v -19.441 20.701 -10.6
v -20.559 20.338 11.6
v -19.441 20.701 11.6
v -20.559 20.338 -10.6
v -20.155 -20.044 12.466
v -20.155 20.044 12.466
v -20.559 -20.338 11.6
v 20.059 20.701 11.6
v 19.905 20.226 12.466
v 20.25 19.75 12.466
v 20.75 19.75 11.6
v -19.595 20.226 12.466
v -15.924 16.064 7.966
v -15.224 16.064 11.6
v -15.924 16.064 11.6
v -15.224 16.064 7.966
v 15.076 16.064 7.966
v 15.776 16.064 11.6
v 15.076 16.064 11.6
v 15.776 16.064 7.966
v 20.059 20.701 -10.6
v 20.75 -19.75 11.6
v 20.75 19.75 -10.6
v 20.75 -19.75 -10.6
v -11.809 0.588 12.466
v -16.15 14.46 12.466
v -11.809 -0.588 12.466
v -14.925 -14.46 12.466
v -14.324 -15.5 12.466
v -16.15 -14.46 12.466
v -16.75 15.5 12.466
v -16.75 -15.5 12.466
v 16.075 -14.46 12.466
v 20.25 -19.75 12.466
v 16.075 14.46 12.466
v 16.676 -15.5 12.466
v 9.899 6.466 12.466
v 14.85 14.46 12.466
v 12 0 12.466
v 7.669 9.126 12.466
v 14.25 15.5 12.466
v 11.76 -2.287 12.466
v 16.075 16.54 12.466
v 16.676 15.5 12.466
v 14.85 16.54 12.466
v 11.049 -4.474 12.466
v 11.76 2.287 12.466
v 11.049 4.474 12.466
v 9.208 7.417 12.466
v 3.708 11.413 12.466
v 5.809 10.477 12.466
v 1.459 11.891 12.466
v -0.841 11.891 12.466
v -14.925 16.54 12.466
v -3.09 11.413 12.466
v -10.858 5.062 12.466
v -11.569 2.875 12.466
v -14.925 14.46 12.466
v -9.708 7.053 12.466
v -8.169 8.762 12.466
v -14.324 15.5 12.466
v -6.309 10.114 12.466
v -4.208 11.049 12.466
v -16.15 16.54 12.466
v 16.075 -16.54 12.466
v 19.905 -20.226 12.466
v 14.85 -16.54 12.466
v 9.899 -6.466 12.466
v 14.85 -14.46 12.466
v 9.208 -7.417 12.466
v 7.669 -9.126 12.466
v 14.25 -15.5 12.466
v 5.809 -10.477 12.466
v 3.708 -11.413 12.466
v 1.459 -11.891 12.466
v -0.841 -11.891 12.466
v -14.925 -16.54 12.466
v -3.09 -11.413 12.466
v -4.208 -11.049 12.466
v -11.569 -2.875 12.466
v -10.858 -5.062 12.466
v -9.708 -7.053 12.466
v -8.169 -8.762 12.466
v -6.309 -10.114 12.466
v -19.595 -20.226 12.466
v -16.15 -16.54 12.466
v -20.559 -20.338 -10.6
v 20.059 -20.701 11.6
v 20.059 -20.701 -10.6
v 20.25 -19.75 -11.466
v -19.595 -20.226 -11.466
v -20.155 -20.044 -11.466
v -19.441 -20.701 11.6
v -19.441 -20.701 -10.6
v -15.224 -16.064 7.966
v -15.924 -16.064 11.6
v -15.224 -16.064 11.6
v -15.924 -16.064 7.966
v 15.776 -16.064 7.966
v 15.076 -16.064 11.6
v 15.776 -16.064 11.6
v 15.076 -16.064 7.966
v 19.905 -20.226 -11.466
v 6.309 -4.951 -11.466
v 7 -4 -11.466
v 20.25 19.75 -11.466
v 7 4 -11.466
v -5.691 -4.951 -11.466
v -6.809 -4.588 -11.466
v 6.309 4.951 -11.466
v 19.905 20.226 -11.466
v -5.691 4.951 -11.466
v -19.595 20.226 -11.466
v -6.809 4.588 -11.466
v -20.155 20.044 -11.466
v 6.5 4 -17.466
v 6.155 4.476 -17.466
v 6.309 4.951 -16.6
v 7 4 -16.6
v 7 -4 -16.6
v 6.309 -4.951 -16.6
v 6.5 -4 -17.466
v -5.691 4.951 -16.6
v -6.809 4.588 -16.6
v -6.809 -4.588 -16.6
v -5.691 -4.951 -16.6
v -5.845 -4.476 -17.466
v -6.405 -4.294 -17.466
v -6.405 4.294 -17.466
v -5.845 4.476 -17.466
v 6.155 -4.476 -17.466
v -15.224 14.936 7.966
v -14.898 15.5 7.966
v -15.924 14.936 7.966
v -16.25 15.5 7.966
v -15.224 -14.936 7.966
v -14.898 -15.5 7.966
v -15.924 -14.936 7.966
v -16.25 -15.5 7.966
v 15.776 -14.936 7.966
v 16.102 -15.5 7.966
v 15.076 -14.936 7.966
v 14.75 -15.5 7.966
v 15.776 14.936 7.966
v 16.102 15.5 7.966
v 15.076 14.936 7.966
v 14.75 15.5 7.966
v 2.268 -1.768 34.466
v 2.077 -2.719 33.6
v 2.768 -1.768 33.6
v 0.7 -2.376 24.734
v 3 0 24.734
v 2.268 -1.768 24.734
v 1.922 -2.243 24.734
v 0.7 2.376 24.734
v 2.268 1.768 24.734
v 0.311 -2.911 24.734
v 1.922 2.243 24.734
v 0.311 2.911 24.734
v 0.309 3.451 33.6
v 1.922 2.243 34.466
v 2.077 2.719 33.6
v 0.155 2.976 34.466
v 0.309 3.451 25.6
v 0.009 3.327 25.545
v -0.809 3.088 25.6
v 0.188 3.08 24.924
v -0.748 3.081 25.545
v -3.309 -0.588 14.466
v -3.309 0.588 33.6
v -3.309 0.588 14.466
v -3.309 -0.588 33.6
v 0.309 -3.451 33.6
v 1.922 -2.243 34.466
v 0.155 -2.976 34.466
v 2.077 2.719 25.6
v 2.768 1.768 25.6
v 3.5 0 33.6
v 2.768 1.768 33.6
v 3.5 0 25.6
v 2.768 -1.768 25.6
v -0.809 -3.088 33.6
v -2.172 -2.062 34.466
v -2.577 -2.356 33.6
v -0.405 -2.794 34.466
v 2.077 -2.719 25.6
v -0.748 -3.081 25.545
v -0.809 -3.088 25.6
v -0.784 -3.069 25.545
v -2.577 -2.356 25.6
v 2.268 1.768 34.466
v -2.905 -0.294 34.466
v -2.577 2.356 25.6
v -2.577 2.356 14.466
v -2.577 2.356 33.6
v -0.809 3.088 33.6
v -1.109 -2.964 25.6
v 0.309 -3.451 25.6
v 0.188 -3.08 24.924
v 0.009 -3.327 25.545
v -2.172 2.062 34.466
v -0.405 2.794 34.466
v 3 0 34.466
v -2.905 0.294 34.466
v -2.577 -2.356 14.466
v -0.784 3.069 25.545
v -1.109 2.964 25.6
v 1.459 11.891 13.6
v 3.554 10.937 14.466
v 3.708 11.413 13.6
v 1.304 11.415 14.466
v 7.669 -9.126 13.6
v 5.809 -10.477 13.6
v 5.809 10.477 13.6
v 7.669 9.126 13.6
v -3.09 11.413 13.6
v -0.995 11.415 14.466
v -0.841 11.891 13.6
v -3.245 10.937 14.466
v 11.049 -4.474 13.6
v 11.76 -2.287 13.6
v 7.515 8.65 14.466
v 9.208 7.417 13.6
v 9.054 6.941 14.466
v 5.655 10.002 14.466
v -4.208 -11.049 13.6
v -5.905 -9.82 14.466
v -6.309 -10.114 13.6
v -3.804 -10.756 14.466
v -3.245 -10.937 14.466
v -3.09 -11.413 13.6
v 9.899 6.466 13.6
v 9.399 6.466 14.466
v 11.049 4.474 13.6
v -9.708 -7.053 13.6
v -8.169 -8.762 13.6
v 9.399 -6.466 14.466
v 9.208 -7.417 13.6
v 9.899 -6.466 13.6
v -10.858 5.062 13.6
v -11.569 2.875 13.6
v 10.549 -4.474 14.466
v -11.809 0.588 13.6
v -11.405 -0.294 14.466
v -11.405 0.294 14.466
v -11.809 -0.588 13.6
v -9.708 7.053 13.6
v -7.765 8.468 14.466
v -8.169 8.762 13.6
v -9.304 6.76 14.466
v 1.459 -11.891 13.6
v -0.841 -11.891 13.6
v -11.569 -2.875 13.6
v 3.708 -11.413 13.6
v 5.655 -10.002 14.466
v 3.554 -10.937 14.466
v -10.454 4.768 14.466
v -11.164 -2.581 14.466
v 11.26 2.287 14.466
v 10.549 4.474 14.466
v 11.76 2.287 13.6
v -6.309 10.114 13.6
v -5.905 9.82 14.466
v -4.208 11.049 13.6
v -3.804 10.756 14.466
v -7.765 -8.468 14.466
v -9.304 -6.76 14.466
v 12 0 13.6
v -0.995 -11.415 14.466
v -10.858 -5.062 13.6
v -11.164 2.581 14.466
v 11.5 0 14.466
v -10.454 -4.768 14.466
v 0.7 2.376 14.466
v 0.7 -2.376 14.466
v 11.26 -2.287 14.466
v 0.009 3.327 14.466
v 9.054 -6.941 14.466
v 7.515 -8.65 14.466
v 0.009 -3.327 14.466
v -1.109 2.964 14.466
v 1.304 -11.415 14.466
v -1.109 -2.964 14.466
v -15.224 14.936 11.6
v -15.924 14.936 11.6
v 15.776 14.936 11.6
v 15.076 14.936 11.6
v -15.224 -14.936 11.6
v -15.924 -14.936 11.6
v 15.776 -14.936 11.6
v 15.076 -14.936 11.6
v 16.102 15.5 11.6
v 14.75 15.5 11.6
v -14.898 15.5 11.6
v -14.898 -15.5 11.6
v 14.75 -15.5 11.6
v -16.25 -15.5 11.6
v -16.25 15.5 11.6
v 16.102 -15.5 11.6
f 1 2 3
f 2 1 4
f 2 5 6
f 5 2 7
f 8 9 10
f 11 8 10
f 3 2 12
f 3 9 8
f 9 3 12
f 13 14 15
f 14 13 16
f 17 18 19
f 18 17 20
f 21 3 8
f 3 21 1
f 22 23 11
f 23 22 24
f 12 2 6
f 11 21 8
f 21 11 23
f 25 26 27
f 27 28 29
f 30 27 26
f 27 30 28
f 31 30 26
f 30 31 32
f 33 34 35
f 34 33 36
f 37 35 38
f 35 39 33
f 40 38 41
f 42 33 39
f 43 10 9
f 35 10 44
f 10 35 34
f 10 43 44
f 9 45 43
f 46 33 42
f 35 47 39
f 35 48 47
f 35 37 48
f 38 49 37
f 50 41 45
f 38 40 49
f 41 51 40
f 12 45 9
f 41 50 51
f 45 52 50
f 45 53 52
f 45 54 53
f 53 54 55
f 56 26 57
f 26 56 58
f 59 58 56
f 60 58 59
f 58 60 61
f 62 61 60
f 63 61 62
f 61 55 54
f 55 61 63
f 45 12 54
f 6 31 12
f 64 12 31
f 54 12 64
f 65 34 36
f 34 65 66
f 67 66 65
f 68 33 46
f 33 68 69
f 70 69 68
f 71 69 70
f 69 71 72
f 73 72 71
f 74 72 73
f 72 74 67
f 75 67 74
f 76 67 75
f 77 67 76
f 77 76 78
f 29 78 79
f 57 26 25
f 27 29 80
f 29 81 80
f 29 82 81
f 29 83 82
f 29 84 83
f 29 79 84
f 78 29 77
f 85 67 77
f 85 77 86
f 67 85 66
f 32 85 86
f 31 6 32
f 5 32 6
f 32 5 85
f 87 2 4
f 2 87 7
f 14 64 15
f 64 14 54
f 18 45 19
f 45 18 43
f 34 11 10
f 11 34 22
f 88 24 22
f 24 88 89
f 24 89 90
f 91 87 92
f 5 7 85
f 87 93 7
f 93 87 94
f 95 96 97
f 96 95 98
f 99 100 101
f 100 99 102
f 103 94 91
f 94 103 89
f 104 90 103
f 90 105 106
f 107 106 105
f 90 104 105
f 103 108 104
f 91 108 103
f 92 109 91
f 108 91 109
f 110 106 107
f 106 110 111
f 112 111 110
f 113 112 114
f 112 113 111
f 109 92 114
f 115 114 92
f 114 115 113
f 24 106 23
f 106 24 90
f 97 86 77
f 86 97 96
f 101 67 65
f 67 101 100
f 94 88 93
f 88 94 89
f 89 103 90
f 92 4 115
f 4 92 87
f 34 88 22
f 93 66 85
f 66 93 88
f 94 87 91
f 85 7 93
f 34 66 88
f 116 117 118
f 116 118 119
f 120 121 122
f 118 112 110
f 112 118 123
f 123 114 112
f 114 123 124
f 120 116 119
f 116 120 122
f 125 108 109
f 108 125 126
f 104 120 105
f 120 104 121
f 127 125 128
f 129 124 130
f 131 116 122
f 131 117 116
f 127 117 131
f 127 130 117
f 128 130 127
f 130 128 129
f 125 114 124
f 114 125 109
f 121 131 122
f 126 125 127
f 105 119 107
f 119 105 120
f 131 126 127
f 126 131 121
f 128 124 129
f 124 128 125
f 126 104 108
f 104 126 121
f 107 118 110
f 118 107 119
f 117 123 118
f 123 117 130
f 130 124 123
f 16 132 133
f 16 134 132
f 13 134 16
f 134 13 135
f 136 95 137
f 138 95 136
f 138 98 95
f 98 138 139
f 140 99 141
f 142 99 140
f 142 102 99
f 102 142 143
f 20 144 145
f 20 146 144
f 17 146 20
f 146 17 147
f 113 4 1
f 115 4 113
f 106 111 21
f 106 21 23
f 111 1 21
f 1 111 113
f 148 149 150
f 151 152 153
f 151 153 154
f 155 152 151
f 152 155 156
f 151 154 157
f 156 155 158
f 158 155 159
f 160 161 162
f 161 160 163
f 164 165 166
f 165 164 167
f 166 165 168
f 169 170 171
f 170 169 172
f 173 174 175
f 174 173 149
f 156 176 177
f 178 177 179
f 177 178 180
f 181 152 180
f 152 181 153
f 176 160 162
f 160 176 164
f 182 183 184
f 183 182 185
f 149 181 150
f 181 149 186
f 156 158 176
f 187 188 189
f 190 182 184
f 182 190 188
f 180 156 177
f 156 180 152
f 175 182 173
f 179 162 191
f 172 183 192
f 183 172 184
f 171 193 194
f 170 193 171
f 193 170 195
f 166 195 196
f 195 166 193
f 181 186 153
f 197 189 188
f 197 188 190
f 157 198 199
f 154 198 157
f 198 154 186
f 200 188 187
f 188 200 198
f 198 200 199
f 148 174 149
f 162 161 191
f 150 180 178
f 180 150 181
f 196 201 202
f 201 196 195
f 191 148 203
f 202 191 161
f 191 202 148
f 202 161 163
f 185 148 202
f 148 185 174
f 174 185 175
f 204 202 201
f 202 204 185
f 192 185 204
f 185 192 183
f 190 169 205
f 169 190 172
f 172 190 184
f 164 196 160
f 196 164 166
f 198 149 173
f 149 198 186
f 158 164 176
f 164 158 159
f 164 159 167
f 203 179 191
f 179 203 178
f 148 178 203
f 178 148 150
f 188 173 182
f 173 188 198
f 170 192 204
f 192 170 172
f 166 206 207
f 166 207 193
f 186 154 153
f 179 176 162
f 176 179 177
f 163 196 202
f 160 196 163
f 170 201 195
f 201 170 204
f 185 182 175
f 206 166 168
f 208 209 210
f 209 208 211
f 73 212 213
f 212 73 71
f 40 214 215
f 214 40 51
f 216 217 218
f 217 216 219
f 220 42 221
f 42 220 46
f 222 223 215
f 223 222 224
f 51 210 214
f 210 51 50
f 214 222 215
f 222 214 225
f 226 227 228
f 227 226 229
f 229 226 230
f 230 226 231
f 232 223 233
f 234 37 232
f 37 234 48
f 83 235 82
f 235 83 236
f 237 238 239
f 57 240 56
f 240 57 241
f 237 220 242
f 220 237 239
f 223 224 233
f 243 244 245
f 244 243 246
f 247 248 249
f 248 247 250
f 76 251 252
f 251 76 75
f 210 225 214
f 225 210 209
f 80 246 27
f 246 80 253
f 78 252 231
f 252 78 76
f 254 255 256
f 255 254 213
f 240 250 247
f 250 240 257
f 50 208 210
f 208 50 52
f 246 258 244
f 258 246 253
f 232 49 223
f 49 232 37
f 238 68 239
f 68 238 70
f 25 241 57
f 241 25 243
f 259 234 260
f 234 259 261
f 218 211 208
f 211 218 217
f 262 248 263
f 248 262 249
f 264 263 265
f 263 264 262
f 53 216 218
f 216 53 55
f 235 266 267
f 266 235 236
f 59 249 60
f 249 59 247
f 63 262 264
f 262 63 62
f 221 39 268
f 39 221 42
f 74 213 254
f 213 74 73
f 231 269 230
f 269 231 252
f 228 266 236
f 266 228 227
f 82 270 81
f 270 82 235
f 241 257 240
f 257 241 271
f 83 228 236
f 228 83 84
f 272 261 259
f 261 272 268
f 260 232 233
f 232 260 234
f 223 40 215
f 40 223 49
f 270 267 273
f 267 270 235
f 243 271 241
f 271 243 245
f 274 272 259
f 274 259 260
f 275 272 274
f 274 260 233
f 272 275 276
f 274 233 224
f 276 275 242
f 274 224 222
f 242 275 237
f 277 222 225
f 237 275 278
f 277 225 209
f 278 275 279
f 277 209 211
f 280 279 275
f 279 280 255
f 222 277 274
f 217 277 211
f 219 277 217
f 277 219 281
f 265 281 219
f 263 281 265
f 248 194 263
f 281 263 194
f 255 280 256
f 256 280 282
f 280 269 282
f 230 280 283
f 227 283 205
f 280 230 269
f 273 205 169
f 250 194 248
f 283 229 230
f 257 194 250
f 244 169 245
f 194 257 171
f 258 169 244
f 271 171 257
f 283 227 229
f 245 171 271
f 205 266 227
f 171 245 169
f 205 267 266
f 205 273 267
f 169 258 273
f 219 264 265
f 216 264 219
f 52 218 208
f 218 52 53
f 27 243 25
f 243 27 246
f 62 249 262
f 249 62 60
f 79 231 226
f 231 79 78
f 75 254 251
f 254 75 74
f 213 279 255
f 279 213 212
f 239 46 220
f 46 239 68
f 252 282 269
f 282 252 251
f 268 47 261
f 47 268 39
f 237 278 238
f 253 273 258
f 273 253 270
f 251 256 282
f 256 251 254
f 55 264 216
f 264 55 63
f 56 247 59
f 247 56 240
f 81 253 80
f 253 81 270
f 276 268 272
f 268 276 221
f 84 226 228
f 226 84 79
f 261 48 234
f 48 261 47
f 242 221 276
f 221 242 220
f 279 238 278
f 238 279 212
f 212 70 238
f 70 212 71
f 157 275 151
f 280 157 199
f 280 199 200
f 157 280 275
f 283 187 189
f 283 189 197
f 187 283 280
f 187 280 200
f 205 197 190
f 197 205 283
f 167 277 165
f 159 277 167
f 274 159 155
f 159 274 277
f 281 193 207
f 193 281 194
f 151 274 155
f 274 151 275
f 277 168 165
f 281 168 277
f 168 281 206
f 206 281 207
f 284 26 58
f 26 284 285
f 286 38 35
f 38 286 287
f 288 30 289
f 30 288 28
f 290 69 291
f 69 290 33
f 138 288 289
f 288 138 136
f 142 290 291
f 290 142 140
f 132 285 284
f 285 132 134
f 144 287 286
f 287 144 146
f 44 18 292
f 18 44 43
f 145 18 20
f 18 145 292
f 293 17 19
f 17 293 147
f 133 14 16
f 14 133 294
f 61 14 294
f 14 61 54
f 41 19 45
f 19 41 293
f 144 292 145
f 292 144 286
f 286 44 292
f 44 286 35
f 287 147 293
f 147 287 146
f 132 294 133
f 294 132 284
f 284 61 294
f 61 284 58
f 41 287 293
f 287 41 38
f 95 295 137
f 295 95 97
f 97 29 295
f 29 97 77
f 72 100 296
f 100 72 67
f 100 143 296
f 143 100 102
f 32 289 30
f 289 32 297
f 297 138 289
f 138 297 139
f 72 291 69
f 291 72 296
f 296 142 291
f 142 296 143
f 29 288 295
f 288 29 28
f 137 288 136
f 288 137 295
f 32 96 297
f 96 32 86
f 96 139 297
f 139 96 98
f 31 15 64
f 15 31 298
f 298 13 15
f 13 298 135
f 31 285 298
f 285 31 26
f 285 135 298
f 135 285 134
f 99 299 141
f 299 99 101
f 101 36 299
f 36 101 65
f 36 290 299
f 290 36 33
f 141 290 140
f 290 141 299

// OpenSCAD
// Parameters
face_W = 39.5; //[20:80:0.1]
face_th = 3; //[1.5:8:0.1]
body_W = 39.5; //[20:80:0.1]
body_H = 39.5; //[20:80:0.1]
body_L = 19.2; //[10:60:0.1]
shaft_d = 5; //[2:12:0.1]
shaft_L = 20; //[5:60:0.1]
boss_d = 22; //[10:40:0.1]
boss_th = 2; //[1:6:0.1]
rear_cap_th = 2; //[1:6:0.1]
mount_spacing = 31; //[15:60:0.1]
mount_hole_d = 3.5; //[2:6:0.1]
mount_hole_depth = 6; //[2:20:0.1]
overlap = 1; //[0.5:2:0.1]
shaft_flat_depth = 0.6; //[0.2:2:0.1]
shaft_flat_L = 12; //[4:40:0.1]
connector_W = 12; //[6:25:0.1]
connector_H = 8; //[4:20:0.1]
connector_L = 6; //[3:20:0.1]
label_W = 18; //[8:40:0.1]
label_H = 12; //[6:30:0.1]
label_th = 0.8; //[0.4:3:0.1]
fillet_r = 1; //[0.5:3:0.1]

// Base Shapes
module motor_body() {
  color("Black")
  cube([body_W, body_H, body_L], center=true);
}

module front_face() {
  color("DimGray")
  translate([0, 0, body_L/2 + face_th/2 - overlap])
    cube([face_W, face_W, face_th], center=true);
}

module front_boss() {
  color("Silver")
  translate([0, 0, body_L/2 + face_th + boss_th/2 - overlap])
    cylinder(r=boss_d/2, h=boss_th, center=true);
}

module rear_cap() {
  color("DimGray")
  translate([0, 0, -body_L/2 - rear_cap_th/2 + overlap])
    cube([body_W, body_H, rear_cap_th], center=true);
}

module output_shaft() {
  color("Silver")
  translate([0, 0, body_L/2 + face_th + boss_th + shaft_L/2 - overlap])
    cylinder(r=shaft_d/2, h=shaft_L, center=true);
}

module mounting_hole(x, y) {
  translate([x, y, body_L/2 + face_th/2 - overlap])
    cylinder(r=mount_hole_d/2, h=mount_hole_depth, center=true);
}

module shaft_flat_cut() {
  translate([shaft_d/2 - shaft_flat_depth/2, 0, body_L/2 + face_th + boss_th + shaft_flat_L/2 - overlap])
    cube([shaft_d, shaft_d, shaft_flat_L], center=true);
}

module connector_bump() {
  color("DimGray")
  translate([0, 0, -body_L/2 - rear_cap_th - connector_L/2 + overlap])
    cube([connector_W, connector_H, connector_L], center=true);
}

module label_plate() {
  color("DimGray")
  translate([body_W/2 + label_th/2 - overlap, 0, 0])
    cube([label_th, label_H, label_W], center=true);
}

module fillet_sphere() {
  sphere(r=fillet_r, center=true);
}

// Operations
module mounting_holes() {
  union() {
    mounting_hole(mount_spacing/2, mount_spacing/2);
    mounting_hole(-mount_spacing/2, mount_spacing/2);
    mounting_hole(-mount_spacing/2, -mount_spacing/2);
    mounting_hole(mount_spacing/2, -mount_spacing/2);
  }
}

module motor_union_raw() {
  union() {
    motor_body();
    front_face();
    front_boss();
    rear_cap();
    output_shaft();
    connector_bump();
    label_plate();
  }
}

module motor_with_mount_holes() {
  difference() {
    motor_union_raw();
    mounting_holes();
  }
}

module motor_with_shaft_flat() {
  difference() {
    motor_with_mount_holes();
    shaft_flat_cut();
  }
}

// Final Output
minkowski() {
  motor_with_shaft_flat();
  fillet_sphere();
}
